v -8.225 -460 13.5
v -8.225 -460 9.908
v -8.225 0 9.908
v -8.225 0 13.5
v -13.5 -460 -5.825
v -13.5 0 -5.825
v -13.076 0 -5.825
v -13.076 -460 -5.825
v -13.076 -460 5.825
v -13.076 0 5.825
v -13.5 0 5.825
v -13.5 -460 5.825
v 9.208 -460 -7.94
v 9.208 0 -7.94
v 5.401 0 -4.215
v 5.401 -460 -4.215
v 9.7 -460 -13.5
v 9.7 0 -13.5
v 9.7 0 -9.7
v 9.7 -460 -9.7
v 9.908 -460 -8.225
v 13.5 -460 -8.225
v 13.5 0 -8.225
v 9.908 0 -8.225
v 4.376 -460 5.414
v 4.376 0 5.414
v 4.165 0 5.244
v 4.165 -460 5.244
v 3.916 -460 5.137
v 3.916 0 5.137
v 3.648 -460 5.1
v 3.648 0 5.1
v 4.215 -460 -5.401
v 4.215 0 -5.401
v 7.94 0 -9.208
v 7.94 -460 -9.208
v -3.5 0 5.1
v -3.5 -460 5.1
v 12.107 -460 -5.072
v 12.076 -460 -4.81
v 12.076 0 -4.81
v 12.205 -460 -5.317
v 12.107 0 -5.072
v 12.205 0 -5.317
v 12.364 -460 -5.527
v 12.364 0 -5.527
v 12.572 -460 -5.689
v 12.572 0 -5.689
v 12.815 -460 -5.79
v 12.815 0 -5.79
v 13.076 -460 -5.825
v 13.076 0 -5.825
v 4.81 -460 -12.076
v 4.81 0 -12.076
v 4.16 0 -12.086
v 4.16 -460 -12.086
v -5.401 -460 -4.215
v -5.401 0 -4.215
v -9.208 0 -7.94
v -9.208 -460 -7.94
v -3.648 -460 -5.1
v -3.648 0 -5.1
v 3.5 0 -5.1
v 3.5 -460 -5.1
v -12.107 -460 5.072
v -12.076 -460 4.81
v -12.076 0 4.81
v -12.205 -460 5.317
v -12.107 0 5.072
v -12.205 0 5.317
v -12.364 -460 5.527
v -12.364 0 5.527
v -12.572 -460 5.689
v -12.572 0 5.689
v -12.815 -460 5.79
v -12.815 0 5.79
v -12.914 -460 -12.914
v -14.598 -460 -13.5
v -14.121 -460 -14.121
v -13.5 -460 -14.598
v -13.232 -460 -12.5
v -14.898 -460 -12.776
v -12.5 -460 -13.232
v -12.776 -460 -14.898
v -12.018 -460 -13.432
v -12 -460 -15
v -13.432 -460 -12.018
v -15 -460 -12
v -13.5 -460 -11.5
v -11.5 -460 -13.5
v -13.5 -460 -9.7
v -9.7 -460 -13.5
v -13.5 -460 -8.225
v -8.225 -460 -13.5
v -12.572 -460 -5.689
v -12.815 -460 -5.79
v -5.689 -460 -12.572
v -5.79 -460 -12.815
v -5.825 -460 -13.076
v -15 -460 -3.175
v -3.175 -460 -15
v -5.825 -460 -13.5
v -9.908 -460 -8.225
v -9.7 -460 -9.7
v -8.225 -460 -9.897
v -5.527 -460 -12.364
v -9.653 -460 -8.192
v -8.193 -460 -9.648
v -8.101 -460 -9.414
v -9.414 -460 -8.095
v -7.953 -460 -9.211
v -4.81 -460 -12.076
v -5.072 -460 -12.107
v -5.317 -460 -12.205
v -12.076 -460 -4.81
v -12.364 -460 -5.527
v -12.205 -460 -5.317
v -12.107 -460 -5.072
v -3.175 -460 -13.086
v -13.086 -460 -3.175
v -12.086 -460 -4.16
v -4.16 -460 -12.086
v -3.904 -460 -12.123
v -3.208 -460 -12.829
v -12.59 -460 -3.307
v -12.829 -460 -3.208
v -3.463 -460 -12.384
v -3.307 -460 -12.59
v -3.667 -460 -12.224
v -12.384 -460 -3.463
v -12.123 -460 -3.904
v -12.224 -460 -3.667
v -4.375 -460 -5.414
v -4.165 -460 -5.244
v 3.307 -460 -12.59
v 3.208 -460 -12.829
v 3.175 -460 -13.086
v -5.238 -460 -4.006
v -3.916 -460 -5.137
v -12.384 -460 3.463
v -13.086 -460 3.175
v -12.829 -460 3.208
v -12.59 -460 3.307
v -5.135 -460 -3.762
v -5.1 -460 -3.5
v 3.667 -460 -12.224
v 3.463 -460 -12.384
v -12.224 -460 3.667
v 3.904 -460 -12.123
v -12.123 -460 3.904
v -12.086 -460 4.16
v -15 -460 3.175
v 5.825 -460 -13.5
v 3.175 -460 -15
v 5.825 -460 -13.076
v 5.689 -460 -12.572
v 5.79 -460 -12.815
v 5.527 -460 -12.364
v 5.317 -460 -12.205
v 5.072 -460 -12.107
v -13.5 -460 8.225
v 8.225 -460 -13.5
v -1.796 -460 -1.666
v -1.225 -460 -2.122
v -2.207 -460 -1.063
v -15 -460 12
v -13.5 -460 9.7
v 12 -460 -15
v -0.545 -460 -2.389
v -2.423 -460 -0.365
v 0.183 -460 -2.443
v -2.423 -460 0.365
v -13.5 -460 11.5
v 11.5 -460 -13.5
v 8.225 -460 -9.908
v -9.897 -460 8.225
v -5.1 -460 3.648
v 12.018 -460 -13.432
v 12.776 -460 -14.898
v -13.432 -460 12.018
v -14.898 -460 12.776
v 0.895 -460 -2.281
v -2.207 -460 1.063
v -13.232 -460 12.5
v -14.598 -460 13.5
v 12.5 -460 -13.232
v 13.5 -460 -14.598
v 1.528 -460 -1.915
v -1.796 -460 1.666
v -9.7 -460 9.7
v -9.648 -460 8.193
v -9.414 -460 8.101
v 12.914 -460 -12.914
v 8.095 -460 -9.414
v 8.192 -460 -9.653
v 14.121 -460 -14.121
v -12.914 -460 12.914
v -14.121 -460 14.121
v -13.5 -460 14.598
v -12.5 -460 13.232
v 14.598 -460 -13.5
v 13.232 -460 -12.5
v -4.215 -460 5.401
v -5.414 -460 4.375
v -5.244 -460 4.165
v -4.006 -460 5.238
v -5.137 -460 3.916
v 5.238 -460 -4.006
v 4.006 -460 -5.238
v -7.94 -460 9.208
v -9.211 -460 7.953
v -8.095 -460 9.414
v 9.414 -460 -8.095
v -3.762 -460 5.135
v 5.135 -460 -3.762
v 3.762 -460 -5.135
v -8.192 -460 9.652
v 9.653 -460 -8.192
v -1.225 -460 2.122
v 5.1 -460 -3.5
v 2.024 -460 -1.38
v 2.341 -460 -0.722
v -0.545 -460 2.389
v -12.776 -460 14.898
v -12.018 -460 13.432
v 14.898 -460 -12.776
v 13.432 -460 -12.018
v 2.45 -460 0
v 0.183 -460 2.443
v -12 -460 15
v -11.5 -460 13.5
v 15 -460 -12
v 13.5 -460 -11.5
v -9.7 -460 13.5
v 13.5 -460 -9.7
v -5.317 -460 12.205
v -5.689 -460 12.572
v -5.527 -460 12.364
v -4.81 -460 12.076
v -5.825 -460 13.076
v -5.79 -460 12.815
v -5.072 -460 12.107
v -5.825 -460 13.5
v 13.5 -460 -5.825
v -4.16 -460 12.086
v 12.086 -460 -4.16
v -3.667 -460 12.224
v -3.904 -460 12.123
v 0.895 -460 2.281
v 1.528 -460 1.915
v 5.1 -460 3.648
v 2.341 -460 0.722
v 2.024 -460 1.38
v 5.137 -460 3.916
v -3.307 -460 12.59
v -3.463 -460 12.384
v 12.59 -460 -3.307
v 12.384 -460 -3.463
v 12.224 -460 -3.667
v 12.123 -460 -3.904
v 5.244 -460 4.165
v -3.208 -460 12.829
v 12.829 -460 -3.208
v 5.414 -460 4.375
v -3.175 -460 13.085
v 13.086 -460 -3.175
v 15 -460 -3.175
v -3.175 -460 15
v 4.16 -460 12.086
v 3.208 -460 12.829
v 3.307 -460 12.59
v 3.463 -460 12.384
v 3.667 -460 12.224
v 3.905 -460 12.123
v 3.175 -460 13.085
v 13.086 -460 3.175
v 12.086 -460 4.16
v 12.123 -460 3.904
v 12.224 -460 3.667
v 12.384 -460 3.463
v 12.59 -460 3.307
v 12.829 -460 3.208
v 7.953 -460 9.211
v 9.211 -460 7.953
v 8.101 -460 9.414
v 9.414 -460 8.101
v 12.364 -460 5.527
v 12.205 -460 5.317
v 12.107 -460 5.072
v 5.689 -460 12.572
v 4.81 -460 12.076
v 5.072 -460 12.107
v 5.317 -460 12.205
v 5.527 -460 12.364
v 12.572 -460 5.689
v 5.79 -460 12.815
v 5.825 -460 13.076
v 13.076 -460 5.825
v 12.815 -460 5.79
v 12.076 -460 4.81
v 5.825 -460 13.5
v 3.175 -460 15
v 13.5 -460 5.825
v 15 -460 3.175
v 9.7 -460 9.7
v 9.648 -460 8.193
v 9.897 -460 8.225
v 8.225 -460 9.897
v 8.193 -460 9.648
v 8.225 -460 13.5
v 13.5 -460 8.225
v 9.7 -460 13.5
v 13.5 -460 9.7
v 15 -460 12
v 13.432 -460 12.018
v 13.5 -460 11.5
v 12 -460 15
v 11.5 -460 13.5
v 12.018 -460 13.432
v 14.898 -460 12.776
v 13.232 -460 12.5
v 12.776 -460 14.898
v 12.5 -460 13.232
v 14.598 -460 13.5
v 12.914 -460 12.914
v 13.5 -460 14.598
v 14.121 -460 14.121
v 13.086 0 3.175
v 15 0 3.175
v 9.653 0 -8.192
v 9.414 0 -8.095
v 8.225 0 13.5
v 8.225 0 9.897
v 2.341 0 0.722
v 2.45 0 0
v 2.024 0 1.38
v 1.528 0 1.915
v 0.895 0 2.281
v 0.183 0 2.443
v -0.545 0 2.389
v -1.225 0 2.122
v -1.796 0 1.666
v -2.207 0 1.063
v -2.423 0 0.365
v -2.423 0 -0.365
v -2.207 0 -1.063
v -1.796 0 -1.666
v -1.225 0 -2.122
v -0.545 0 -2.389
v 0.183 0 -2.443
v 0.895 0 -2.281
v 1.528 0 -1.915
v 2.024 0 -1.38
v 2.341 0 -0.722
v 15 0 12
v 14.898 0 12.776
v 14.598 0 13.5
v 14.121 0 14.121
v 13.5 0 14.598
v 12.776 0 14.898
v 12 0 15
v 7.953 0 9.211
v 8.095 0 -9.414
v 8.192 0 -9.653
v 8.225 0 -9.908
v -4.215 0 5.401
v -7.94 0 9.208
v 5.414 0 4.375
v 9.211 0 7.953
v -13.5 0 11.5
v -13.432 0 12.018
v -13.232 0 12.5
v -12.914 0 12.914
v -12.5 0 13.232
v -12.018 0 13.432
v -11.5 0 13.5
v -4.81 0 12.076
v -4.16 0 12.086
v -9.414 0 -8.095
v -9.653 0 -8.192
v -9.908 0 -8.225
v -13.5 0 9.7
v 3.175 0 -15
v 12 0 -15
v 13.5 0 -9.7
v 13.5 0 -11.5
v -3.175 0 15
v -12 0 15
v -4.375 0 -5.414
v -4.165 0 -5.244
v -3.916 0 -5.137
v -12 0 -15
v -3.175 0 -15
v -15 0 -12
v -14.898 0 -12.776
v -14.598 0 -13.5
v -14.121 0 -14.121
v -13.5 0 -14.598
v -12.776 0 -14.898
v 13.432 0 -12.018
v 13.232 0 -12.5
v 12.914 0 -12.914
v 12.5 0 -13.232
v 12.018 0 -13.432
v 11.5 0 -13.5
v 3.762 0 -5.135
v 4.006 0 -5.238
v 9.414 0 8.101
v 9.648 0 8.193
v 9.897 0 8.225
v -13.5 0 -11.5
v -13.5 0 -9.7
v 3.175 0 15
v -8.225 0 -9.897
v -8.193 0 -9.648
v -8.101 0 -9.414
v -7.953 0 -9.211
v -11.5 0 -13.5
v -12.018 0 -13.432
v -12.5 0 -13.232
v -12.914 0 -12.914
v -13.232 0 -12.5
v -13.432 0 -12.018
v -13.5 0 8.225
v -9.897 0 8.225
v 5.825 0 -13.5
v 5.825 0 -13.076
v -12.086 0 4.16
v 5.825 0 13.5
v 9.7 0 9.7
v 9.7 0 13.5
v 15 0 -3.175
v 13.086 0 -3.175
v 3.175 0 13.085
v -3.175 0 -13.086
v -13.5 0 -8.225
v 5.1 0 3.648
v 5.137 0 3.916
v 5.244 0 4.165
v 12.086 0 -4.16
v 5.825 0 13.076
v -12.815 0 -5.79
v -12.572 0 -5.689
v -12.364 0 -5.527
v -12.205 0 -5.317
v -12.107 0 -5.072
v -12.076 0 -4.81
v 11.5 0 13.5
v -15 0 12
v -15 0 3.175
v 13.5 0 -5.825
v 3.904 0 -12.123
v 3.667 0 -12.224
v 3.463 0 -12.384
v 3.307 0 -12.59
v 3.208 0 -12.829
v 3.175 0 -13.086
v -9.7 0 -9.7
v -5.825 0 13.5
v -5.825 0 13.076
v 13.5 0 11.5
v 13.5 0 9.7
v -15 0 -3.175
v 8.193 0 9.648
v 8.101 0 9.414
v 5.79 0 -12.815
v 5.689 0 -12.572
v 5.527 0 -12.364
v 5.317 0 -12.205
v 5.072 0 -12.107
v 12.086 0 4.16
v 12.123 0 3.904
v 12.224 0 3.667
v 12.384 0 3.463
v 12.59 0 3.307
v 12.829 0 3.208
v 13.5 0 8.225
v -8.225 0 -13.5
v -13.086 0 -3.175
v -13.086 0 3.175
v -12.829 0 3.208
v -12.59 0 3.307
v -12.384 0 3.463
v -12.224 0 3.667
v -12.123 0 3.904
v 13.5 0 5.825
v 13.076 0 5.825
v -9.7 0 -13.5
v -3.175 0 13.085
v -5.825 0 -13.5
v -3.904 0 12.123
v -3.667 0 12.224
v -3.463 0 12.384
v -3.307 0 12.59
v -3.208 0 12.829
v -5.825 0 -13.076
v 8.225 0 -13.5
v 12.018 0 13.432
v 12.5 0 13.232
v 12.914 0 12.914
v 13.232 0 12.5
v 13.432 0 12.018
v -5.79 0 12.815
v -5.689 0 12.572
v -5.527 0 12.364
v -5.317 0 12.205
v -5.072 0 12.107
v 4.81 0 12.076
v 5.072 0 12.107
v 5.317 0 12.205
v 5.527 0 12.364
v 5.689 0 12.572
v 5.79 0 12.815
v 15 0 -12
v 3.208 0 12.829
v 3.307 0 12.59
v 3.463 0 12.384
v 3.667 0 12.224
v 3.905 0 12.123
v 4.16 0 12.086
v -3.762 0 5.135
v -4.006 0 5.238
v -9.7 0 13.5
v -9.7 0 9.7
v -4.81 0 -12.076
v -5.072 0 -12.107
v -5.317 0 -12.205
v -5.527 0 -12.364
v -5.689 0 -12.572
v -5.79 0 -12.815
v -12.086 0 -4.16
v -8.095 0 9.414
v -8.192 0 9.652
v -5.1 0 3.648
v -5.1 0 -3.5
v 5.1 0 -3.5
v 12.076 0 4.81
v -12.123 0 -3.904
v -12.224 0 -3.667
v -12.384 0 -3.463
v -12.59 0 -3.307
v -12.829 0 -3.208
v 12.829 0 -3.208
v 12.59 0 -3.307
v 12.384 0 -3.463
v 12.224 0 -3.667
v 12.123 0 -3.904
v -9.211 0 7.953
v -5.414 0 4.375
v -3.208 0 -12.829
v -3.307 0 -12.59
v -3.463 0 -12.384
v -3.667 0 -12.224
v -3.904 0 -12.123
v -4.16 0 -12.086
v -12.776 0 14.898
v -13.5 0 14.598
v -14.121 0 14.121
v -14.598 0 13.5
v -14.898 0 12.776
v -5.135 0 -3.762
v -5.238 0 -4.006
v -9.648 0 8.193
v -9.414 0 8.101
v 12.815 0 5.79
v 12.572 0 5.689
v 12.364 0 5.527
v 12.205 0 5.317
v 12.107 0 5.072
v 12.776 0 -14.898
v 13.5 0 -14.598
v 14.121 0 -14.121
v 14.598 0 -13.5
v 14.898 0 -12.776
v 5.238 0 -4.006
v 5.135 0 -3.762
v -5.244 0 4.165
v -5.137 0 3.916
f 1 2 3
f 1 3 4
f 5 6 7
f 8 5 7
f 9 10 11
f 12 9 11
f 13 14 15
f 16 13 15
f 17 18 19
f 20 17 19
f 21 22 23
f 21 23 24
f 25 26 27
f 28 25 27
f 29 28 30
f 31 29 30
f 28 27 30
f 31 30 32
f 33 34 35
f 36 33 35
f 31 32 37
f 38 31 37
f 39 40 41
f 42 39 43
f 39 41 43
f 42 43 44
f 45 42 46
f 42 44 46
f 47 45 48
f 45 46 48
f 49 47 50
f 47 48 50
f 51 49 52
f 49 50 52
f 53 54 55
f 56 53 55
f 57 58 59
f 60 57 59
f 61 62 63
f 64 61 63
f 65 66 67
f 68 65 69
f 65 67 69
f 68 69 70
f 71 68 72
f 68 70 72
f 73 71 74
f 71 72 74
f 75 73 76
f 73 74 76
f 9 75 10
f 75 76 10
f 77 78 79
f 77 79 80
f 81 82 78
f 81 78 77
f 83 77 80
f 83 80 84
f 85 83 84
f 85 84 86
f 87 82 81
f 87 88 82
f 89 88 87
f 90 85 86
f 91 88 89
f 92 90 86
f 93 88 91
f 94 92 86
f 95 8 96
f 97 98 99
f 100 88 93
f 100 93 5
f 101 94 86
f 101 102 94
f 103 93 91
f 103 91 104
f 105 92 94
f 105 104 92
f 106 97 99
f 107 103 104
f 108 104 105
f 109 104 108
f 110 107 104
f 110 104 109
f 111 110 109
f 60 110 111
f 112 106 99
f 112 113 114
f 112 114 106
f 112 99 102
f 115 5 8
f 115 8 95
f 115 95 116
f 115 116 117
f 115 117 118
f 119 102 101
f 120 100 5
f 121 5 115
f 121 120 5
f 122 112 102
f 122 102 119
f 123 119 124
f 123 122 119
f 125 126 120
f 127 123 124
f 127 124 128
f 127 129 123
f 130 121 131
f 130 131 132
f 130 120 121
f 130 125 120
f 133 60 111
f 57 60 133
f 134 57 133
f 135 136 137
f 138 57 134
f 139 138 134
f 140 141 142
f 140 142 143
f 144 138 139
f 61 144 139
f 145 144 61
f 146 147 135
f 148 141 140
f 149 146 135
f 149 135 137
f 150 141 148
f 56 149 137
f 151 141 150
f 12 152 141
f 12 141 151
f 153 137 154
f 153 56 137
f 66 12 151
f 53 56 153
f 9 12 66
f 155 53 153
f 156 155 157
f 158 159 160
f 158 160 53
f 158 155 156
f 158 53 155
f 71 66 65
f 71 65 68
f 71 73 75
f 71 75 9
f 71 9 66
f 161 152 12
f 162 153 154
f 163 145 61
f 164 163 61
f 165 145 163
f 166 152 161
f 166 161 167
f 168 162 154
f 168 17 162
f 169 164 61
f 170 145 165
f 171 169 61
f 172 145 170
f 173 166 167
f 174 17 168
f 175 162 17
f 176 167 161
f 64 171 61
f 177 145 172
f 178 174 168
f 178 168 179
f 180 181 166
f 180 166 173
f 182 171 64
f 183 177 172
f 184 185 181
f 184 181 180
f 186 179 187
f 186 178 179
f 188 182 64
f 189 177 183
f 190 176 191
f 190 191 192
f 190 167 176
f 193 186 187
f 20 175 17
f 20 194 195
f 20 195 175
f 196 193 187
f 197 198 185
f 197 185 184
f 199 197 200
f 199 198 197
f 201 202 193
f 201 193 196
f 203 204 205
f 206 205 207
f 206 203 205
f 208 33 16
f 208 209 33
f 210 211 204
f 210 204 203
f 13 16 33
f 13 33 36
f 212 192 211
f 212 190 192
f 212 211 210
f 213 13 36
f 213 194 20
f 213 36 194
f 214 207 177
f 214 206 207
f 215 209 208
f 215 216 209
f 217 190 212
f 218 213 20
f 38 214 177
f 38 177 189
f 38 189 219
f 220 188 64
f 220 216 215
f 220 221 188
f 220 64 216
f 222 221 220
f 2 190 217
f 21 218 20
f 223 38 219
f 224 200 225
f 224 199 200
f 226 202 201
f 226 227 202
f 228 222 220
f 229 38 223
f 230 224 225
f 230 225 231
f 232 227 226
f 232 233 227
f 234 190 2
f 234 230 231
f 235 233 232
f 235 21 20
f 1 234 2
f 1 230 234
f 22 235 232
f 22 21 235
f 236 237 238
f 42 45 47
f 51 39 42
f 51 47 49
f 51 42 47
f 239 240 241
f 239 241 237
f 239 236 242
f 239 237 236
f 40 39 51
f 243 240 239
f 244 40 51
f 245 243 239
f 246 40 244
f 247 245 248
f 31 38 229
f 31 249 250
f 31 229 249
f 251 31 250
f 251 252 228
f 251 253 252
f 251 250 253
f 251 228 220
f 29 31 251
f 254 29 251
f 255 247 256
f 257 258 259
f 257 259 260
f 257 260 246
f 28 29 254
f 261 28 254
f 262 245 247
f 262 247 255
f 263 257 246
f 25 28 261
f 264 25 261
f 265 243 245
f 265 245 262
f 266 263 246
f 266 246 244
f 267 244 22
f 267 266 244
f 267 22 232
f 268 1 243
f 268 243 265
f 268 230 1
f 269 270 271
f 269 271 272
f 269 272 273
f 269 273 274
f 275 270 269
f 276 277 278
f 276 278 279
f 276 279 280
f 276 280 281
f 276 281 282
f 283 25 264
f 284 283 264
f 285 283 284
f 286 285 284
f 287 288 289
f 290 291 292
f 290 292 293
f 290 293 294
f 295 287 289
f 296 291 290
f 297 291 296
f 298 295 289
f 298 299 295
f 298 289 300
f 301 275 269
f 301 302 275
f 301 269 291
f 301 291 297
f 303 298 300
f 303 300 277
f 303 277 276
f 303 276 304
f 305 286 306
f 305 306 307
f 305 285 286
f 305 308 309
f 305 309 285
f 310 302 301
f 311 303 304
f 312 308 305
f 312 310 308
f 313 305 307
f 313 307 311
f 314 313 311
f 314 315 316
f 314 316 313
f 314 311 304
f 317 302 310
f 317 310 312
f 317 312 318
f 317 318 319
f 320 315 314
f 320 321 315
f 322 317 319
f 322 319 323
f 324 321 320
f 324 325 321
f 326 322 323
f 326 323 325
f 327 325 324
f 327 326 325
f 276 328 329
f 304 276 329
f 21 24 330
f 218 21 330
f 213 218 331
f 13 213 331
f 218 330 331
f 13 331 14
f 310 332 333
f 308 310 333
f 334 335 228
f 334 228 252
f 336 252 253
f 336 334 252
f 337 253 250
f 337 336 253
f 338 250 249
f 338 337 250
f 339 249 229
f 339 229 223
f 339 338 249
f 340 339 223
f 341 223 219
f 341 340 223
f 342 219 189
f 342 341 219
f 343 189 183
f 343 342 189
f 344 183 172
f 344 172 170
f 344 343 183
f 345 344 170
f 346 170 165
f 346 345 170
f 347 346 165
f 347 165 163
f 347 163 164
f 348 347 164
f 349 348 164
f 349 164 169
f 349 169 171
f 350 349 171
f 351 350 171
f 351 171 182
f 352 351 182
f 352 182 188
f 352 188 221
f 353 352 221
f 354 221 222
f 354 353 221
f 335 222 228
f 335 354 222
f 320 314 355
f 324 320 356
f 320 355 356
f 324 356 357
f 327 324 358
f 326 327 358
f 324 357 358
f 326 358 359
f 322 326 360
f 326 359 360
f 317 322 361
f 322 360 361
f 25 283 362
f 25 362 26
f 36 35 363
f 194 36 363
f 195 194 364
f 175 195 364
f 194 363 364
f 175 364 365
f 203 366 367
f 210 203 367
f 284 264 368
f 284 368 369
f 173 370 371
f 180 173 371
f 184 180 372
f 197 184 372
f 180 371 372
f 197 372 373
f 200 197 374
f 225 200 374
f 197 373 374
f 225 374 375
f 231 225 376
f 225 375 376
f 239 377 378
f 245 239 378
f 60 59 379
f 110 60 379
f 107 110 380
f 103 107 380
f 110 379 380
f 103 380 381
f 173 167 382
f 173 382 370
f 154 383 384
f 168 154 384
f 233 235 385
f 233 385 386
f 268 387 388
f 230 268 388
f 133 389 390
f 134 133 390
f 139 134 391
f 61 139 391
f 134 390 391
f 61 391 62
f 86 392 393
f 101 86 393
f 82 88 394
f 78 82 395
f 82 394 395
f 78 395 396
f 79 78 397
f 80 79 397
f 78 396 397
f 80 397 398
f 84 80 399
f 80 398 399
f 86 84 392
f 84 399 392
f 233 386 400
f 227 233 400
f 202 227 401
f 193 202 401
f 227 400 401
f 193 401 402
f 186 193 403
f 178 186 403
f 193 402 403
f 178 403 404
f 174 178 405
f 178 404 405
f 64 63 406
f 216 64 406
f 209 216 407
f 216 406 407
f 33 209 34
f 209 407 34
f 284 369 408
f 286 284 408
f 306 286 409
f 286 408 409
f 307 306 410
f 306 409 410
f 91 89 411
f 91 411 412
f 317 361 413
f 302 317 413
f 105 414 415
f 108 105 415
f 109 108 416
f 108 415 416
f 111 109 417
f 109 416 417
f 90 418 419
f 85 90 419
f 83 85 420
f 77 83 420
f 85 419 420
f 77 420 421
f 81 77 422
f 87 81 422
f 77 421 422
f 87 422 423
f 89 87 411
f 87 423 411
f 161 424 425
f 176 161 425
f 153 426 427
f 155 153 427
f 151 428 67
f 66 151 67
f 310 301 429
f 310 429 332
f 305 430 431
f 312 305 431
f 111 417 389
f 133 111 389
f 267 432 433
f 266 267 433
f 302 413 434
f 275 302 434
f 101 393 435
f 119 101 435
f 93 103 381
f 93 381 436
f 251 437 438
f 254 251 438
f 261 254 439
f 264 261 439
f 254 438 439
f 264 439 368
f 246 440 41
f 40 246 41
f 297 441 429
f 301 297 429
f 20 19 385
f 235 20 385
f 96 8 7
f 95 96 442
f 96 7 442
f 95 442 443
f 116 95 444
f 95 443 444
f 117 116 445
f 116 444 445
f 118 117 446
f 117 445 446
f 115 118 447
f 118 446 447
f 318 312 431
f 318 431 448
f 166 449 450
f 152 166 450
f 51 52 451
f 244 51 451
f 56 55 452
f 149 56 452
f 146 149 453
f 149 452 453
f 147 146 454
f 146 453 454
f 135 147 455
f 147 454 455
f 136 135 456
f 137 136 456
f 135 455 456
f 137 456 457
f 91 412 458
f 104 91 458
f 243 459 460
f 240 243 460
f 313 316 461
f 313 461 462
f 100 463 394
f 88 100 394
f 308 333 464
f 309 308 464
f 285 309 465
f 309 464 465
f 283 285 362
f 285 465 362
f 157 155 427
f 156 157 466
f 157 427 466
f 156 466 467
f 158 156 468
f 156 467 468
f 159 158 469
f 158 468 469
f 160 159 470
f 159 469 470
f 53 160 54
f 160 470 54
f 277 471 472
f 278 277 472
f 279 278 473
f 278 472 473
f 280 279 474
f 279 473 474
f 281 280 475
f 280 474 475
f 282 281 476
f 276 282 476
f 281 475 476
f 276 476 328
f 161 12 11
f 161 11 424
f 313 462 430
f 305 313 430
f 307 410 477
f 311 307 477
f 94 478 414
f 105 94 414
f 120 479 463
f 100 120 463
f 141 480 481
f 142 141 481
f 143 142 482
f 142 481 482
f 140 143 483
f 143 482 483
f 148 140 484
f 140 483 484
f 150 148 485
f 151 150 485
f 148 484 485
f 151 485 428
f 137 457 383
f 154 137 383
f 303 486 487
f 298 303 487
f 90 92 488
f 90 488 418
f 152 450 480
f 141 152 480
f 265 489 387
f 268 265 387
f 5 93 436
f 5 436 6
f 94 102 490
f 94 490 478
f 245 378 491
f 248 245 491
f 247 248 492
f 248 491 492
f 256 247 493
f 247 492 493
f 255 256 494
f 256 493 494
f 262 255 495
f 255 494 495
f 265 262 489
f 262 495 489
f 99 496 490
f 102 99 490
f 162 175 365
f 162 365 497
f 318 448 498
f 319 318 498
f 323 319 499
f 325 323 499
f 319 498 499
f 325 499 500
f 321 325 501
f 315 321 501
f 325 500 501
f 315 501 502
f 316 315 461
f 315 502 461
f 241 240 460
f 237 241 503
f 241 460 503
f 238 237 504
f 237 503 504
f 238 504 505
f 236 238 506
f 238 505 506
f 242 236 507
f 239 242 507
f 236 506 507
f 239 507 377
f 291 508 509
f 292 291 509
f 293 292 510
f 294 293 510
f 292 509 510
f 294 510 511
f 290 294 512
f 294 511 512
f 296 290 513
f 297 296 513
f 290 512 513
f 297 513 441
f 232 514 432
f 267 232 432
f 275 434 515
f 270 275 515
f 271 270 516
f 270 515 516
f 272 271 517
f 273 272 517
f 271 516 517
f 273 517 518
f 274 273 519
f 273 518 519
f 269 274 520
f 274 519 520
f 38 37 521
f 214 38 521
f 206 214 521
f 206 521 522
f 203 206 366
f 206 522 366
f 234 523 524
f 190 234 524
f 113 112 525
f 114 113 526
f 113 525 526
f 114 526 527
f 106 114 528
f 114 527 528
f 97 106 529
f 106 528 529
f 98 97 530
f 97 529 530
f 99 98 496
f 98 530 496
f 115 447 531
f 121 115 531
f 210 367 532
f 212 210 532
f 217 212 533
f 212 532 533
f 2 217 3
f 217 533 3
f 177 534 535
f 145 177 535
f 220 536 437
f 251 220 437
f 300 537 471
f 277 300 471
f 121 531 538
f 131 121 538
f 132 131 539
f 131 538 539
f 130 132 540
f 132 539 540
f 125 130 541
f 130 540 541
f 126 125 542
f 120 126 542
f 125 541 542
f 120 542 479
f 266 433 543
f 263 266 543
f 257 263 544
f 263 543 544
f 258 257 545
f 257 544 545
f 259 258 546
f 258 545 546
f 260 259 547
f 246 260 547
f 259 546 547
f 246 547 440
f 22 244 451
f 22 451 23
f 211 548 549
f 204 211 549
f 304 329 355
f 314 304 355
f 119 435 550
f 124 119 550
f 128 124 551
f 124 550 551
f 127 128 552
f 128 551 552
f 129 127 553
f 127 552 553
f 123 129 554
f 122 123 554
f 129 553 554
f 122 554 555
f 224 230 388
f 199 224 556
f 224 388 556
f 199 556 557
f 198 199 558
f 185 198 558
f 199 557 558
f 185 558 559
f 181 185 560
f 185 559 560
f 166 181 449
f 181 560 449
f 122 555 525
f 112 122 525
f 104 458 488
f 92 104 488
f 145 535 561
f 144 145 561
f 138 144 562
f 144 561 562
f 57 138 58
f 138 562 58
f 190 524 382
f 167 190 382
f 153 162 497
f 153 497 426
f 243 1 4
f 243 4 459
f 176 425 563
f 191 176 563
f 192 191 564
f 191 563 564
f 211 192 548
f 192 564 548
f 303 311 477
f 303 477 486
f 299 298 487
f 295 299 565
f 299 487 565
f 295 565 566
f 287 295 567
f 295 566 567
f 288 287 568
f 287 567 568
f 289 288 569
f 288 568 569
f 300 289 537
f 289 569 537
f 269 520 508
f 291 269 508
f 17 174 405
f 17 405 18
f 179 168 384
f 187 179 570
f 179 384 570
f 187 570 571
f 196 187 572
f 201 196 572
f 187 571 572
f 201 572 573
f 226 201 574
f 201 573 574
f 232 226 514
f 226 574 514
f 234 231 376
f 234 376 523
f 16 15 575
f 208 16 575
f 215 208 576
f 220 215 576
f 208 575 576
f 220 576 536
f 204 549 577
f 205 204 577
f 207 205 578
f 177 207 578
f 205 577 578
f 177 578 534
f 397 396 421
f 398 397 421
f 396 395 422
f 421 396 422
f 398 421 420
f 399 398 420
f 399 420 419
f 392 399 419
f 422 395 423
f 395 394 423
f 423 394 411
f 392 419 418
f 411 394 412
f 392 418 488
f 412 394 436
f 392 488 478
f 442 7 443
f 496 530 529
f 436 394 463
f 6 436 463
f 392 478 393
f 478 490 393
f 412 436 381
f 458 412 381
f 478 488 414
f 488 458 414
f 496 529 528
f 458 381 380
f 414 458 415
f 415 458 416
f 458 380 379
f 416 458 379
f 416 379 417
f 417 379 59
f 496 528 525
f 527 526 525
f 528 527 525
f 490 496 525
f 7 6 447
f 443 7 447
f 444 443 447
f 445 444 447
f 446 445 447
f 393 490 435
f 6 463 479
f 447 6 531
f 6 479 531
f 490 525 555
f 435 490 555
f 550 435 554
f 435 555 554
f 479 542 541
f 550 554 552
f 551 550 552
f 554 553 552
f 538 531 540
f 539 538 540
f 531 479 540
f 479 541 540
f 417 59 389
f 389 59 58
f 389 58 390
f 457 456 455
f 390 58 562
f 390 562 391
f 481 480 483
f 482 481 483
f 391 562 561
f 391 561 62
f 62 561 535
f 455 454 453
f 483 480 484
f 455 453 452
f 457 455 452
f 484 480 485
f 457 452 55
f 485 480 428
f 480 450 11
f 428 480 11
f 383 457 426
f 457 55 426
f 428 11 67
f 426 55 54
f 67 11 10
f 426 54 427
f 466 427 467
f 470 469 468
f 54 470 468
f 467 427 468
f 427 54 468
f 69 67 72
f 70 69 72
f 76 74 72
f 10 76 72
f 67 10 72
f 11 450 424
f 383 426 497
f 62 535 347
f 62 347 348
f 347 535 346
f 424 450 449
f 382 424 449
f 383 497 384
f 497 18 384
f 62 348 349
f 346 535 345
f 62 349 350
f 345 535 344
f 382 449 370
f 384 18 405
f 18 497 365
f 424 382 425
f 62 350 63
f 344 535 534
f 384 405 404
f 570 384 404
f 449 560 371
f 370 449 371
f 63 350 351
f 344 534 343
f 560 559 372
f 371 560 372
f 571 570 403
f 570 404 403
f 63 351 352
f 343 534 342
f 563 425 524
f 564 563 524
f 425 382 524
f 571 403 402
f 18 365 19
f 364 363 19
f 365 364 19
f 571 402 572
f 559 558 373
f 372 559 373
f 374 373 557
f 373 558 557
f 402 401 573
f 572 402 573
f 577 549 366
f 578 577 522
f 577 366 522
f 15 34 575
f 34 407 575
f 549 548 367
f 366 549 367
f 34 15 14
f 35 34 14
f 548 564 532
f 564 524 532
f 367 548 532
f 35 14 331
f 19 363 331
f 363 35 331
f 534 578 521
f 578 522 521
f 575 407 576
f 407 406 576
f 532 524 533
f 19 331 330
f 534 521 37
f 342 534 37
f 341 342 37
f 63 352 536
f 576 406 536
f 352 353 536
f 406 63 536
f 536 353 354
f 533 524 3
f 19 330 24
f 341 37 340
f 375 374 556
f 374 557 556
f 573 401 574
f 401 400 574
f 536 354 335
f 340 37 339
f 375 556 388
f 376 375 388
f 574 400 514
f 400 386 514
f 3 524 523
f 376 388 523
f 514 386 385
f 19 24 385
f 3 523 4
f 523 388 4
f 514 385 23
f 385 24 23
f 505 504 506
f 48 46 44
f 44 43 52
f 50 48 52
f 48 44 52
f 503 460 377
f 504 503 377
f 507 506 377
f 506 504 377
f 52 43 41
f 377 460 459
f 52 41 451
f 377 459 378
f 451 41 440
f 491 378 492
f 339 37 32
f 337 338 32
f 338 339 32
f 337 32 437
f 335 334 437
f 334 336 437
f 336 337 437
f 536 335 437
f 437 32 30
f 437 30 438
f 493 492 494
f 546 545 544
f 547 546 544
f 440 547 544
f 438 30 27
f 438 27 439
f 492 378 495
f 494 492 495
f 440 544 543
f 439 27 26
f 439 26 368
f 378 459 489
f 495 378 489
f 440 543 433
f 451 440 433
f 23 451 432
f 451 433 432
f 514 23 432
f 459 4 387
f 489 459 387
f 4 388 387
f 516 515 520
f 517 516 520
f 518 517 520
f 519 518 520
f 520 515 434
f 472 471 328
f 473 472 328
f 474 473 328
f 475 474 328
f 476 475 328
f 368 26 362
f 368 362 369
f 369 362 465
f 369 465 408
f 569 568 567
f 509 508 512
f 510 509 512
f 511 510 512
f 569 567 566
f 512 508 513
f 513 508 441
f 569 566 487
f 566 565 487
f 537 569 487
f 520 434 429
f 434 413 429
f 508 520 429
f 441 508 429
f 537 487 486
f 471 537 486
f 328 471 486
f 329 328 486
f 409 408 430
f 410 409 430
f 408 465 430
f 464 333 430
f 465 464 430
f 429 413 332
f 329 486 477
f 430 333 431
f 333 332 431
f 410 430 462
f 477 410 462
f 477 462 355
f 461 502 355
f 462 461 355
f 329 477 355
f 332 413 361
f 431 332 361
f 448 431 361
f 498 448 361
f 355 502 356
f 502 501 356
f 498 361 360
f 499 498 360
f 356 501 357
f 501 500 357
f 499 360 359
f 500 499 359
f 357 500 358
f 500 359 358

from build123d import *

# Parameters (mm, degrees)
F0_R     = 2.45
F1_DEPTH = 460


# Not quite as in the source:
# - ends of sketch curves that miss each other by under 0.0002 mm in the source are joined


with BuildPart() as f1:
    # F0 (on Front) → F1 (new body)
    with BuildSketch(Plane.XZ):
        with BuildLine():
            Line((-3.1749674082, 15), (-12, 15))
            ThreePointArc((-12, 15), (-14.1213203436, 14.1213203436), (-15, 12))
            Line((-15, 12), (-15, 3.175))
            Line((-15, 3.175), (-13.0855346263, 3.175))
            ThreePointArc((-13.0855346263, 3.175), (-12.3835980145, 3.4627605788), (-12.0856407741, 4.1604300138))
            Line((-12.0856407741, 4.1604300138), (-12.0761692778, 4.8104300138))
            ThreePointArc((-12.0761692778, 4.8104300138), (-12.3638237087, 5.5269366118), (-13.0760631299, 5.825))
            Line((-13.0760631299, 5.825), (-13.5, 5.825))
            Line((-13.5, 5.825), (-13.5, 8.225))
            Line((-13.5, 8.225), (-9.8968845016, 8.225))
            ThreePointArc((-9.8968845016, 8.225), (-9.5279915195, 8.1544718757), (-9.2111331975, 7.9528359354))
            Line((-9.2111331975, 7.9528359354), (-5.4142486959, 4.3754933338))
            ThreePointArc((-5.4142486959, 4.3754933338), (-5.1819174045, 4.0440465354), (-5.1, 3.6476573984))
            Line((-5.1, 3.6476573984), (-5.1, -3.4999243287))
            ThreePointArc((-5.1, -3.4999243287), (-5.1782354607, -3.8876744211), (-5.4007002683, -4.2147528992))
            Line((-5.4007002683, -4.2147528992), (-9.2084959767, -7.9398285705))
            ThreePointArc((-9.2084959767, -7.9398285705), (-9.5301904718, -8.1509666761), (-9.9077957084, -8.225))
            Line((-9.9077957084, -8.225), (-13.5, -8.225))
            Line((-13.5, -8.225), (-13.5, -5.825))
            Line((-13.5, -5.825), (-13.0760631299, -5.825))
            ThreePointArc((-13.0760631299, -5.825), (-12.3638237087, -5.5269366118), (-12.0761692778, -4.8104300138))
            Line((-12.0761692778, -4.8104300138), (-12.0856407741, -4.1604300138))
            ThreePointArc((-12.0856407741, -4.1604300138), (-12.3835980145, -3.4627605788), (-13.0855346263, -3.175))
            Line((-13.0855346263, -3.175), (-15, -3.175))
            Line((-15, -3.175), (-15, -12))
            ThreePointArc((-15, -12), (-14.1213203436, -14.1213203436), (-12, -15))
            Line((-12, -15), (-3.175, -15))
            Line((-3.175, -15), (-3.175, -13.0855346263))
            ThreePointArc((-3.175, -13.0855346263), (-3.4627605788, -12.3835980145), (-4.1604300138, -12.0856407741))
            Line((-4.1604300138, -12.0856407741), (-4.8104300138, -12.0761692778))
            ThreePointArc((-4.8104300138, -12.0761692778), (-5.5269366118, -12.3638237087), (-5.825, -13.0760631299))
            Line((-5.825, -13.0760631299), (-5.825, -13.5))
            Line((-5.825, -13.5), (-8.225, -13.5))
            Line((-8.225, -13.5), (-8.225, -9.8968845016))
            ThreePointArc((-8.225, -9.8968845016), (-8.1544718757, -9.5279915195), (-7.9528359354, -9.2111331975))
            Line((-7.9528359354, -9.2111331975), (-4.3754933338, -5.4142486959))
            ThreePointArc((-4.3754933338, -5.4142486959), (-4.0440465354, -5.1819174045), (-3.6476573984, -5.1))
            Line((-3.6476573984, -5.1), (3.4999243287, -5.1))
            ThreePointArc((3.4999243287, -5.1), (3.8876744211, -5.1782354607), (4.2147528992, -5.4007002683))
            Line((4.2147528992, -5.4007002683), (7.9398285705, -9.2084959767))
            ThreePointArc((7.9398285705, -9.2084959767), (8.1509666761, -9.5301904718), (8.225, -9.9077957084))
            Line((8.225, -9.9077957084), (8.225, -13.5))
            Line((8.225, -13.5), (5.825, -13.5))
            Line((5.825, -13.5), (5.825, -13.0760631299))
            ThreePointArc((5.825, -13.0760631299), (5.5269366118, -12.3638237087), (4.8104300138, -12.0761692778))
            Line((4.8104300138, -12.0761692778), (4.1604300138, -12.0856407741))
            ThreePointArc((4.1604300138, -12.0856407741), (3.4627605788, -12.3835980145), (3.175, -13.0855346263))
            Line((3.175, -13.0855346263), (3.175, -15))
            Line((3.175, -15), (12, -15))
            ThreePointArc((12, -15), (14.1213203436, -14.1213203436), (15, -12))
            Line((15, -12), (15, -3.175))
            Line((15, -3.175), (13.0855346263, -3.175))
            ThreePointArc((13.0855346263, -3.175), (12.3835980145, -3.4627605788), (12.0856407741, -4.1604300138))
            Line((12.0856407741, -4.1604300138), (12.0761692778, -4.8104300138))
            ThreePointArc((12.0761692778, -4.8104300138), (12.3638237087, -5.5269366118), (13.0760631299, -5.825))
            Line((13.0760631299, -5.825), (13.5, -5.825))
            Line((13.5, -5.825), (13.5, -8.225))
            Line((13.5, -8.225), (9.9077957084, -8.225))
            ThreePointArc((9.9077957084, -8.225), (9.5301904718, -8.1509666761), (9.2084959767, -7.9398285705))
            Line((9.2084959767, -7.9398285705), (5.4007002683, -4.2147528992))
            ThreePointArc((5.4007002683, -4.2147528992), (5.1782354607, -3.8876744211), (5.1, -3.4999243287))
            Line((5.1, -3.4999243287), (5.1, 3.6476573984))
            ThreePointArc((5.1, 3.6476573984), (5.1819174045, 4.0440465354), (5.4142486959, 4.3754933338))
            Line((5.4142486959, 4.3754933338), (9.2111331975, 7.9528359354))
            ThreePointArc((9.2111331975, 7.9528359354), (9.5279915195, 8.1544718757), (9.8968845016, 8.225))
            Line((9.8968845016, 8.225), (13.5, 8.225))
            Line((13.5, 8.225), (13.5, 5.825))
            Line((13.5, 5.825), (13.0760631299, 5.825))
            ThreePointArc((13.0760631299, 5.825), (12.3638237087, 5.5269366118), (12.0761692778, 4.8104300138))
            Line((12.0761692778, 4.8104300138), (12.0856407741, 4.1604300138))
            ThreePointArc((12.0856407741, 4.1604300138), (12.3835980145, 3.4627605788), (13.0855346263, 3.175))
            Line((13.0855346263, 3.175), (15, 3.175))
            Line((15, 3.175), (15, 12))
            ThreePointArc((15, 12), (14.1213203436, 14.1213203436), (12, 15))
            Line((12, 15), (3.1750325918, 15))
            Line((3.1750325918, 15), (3.1750325918, 13.0854824722))
            ThreePointArc((3.1750325918, 13.0854824722), (3.4627931706, 12.3835458604), (4.1604626057, 12.0855886201))
            Line((4.1604626057, 12.0855886201), (4.8104626057, 12.0761171237))
            ThreePointArc((4.8104626057, 12.0761171237), (5.5269692036, 12.3637715546), (5.8250325918, 13.0760109758))
            Line((5.8250325918, 13.0760109758), (5.8250325918, 13.4999478459))
            Line((5.8250325918, 13.4999478459), (8.2250325918, 13.4999478459))
            Line((8.2250325918, 13.4999478459), (8.2250325918, 9.8968323476))
            ThreePointArc((8.2250325918, 9.8968323476), (8.1545044675, 9.5279393654), (7.9528685272, 9.2110810434))
            Line((7.9528685272, 9.2110810434), (4.3755259256, 5.4141965418))
            ThreePointArc((4.3755259256, 5.4141965418), (4.0440791272, 5.1818652505), (3.6476899902, 5.0999478459))
            Line((3.6476899902, 5.0999478459), (-3.4998917369, 5.0999478459))
            ThreePointArc((-3.4998917369, 5.0999478459), (-3.8876418293, 5.1781833067), (-4.2147203074, 5.4006481142))
            Line((-4.2147203074, 5.4006481142), (-7.9397959787, 9.2084438226))
            ThreePointArc((-7.9397959787, 9.2084438226), (-8.1509340843, 9.5301383177), (-8.2249674082, 9.9077435543))
            Line((-8.2249674082, 9.9077435543), (-8.2249674082, 13.4999478459))
            Line((-8.2249674082, 13.4999478459), (-5.8249674082, 13.4999478459))
            Line((-5.8249674082, 13.4999478459), (-5.8249674082, 13.0760109758))
            ThreePointArc((-5.8249674082, 13.0760109758), (-5.5269040199, 12.3637715546), (-4.810397422, 12.0761171237))
            Line((-4.810397422, 12.0761171237), (-4.160397422, 12.0855886201))
            ThreePointArc((-4.160397422, 12.0855886201), (-3.462727987, 12.3835458604), (-3.1749674082, 13.0854824722))
            Line((-3.1749674082, 13.0854824722), (-3.1749674082, 15))
        make_face()
        with BuildLine():
            Line((-13.5, -11.5), (-13.5, -9.7))
            Line((-13.5, -9.7), (-9.7, -9.7))
            Line((-9.7, -9.7), (-9.7, -13.5))
            Line((-9.7, -13.5), (-11.5, -13.5))
            ThreePointArc((-11.5, -13.5), (-12.9142135624, -12.9142135624), (-13.5, -11.5))
        make_face(mode=Mode.SUBTRACT)
        with BuildLine():
            Line((9.7, -9.7), (13.5, -9.7))
            Line((13.5, -9.7), (13.5, -11.5))
            ThreePointArc((13.5, -11.5), (12.9142135624, -12.9142135624), (11.5, -13.5))
            Line((11.5, -13.5), (9.7, -13.5))
            Line((9.7, -13.5), (9.7, -9.7))
        make_face(mode=Mode.SUBTRACT)
        with BuildLine():
            ThreePointArc((-13.5, 11.5), (-12.9142135624, 12.9142135624), (-11.5, 13.5))
            Line((-11.5, 13.5), (-9.7, 13.5))
            Line((-9.7, 13.5), (-9.7, 9.7))
            Line((-9.7, 9.7), (-13.5, 9.7))
            Line((-13.5, 9.7), (-13.5, 11.5))
        make_face(mode=Mode.SUBTRACT)
        Circle(F0_R, mode=Mode.SUBTRACT)
        with BuildLine():
            Line((9.7, 13.5), (11.5, 13.5))
            ThreePointArc((11.5, 13.5), (12.9142135624, 12.9142135624), (13.5, 11.5))
            Line((13.5, 11.5), (13.5, 9.7))
            Line((13.5, 9.7), (9.7, 9.7))
            Line((9.7, 9.7), (9.7, 13.5))
        make_face(mode=Mode.SUBTRACT)
    extrude(amount=F1_DEPTH)


solid = f1.part
